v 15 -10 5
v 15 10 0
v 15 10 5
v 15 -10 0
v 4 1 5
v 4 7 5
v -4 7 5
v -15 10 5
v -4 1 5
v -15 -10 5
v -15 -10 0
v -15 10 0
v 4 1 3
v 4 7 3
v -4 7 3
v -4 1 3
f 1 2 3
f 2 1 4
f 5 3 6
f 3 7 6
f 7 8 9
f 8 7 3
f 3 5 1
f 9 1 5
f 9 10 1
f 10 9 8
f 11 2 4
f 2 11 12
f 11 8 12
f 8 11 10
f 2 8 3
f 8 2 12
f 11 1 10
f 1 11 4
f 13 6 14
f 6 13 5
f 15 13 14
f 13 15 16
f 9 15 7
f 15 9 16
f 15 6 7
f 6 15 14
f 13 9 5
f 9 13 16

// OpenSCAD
// Auto-generated from tests/data/feature_fixtures_manifest.json
// fixture: plate_rectangular_top_pocket
// fixture_type: plate
// description: Plate with one shallow rectangular top pocket to exercise blind-cuboid subtraction detection.
$fn = 96;

plate_size = [30.000000, 20.000000, 5.000000];
plate_origin = [-15.000000, -10.000000, 0.000000];

module through_hole(center, diameter, height) {
  translate(center) cylinder(d=diameter, h=height, center=false);
}

module through_slot(start, end, width, height) {
  hull() {
    through_hole(start, width, height);
    through_hole(end, width, height);
  }
}

module counterbore_hole(center, through_d, bore_d, bore_depth, plate_thickness) {
  translate([center[0], center[1], -0.1])
    cylinder(d=through_d, h=plate_thickness + 0.2, center=false);
  translate([center[0], center[1], plate_thickness - bore_depth])
    cylinder(d=bore_d, h=bore_depth + 0.1, center=false);
}

module rectangular_through_cutout(center, size_xy, plate_thickness) {
  translate([center[0] - size_xy[0] / 2, center[1] - size_xy[1] / 2, -0.1])
    cube([size_xy[0], size_xy[1], plate_thickness + 0.2]);
}

module rectangular_top_pocket(center, size_xy, pocket_depth, plate_thickness) {
  translate([center[0] - size_xy[0] / 2, center[1] - size_xy[1] / 2, plate_thickness - pocket_depth])
    cube([size_xy[0], size_xy[1], pocket_depth + 0.1]);
}

difference() {
  translate(plate_origin) cube(plate_size);
  rectangular_top_pocket([0.000000, 4.000000, 0.000000], [8.000000, 6.000000], 2.000000, 5.000000);  // rectangular_pocket_0
}
